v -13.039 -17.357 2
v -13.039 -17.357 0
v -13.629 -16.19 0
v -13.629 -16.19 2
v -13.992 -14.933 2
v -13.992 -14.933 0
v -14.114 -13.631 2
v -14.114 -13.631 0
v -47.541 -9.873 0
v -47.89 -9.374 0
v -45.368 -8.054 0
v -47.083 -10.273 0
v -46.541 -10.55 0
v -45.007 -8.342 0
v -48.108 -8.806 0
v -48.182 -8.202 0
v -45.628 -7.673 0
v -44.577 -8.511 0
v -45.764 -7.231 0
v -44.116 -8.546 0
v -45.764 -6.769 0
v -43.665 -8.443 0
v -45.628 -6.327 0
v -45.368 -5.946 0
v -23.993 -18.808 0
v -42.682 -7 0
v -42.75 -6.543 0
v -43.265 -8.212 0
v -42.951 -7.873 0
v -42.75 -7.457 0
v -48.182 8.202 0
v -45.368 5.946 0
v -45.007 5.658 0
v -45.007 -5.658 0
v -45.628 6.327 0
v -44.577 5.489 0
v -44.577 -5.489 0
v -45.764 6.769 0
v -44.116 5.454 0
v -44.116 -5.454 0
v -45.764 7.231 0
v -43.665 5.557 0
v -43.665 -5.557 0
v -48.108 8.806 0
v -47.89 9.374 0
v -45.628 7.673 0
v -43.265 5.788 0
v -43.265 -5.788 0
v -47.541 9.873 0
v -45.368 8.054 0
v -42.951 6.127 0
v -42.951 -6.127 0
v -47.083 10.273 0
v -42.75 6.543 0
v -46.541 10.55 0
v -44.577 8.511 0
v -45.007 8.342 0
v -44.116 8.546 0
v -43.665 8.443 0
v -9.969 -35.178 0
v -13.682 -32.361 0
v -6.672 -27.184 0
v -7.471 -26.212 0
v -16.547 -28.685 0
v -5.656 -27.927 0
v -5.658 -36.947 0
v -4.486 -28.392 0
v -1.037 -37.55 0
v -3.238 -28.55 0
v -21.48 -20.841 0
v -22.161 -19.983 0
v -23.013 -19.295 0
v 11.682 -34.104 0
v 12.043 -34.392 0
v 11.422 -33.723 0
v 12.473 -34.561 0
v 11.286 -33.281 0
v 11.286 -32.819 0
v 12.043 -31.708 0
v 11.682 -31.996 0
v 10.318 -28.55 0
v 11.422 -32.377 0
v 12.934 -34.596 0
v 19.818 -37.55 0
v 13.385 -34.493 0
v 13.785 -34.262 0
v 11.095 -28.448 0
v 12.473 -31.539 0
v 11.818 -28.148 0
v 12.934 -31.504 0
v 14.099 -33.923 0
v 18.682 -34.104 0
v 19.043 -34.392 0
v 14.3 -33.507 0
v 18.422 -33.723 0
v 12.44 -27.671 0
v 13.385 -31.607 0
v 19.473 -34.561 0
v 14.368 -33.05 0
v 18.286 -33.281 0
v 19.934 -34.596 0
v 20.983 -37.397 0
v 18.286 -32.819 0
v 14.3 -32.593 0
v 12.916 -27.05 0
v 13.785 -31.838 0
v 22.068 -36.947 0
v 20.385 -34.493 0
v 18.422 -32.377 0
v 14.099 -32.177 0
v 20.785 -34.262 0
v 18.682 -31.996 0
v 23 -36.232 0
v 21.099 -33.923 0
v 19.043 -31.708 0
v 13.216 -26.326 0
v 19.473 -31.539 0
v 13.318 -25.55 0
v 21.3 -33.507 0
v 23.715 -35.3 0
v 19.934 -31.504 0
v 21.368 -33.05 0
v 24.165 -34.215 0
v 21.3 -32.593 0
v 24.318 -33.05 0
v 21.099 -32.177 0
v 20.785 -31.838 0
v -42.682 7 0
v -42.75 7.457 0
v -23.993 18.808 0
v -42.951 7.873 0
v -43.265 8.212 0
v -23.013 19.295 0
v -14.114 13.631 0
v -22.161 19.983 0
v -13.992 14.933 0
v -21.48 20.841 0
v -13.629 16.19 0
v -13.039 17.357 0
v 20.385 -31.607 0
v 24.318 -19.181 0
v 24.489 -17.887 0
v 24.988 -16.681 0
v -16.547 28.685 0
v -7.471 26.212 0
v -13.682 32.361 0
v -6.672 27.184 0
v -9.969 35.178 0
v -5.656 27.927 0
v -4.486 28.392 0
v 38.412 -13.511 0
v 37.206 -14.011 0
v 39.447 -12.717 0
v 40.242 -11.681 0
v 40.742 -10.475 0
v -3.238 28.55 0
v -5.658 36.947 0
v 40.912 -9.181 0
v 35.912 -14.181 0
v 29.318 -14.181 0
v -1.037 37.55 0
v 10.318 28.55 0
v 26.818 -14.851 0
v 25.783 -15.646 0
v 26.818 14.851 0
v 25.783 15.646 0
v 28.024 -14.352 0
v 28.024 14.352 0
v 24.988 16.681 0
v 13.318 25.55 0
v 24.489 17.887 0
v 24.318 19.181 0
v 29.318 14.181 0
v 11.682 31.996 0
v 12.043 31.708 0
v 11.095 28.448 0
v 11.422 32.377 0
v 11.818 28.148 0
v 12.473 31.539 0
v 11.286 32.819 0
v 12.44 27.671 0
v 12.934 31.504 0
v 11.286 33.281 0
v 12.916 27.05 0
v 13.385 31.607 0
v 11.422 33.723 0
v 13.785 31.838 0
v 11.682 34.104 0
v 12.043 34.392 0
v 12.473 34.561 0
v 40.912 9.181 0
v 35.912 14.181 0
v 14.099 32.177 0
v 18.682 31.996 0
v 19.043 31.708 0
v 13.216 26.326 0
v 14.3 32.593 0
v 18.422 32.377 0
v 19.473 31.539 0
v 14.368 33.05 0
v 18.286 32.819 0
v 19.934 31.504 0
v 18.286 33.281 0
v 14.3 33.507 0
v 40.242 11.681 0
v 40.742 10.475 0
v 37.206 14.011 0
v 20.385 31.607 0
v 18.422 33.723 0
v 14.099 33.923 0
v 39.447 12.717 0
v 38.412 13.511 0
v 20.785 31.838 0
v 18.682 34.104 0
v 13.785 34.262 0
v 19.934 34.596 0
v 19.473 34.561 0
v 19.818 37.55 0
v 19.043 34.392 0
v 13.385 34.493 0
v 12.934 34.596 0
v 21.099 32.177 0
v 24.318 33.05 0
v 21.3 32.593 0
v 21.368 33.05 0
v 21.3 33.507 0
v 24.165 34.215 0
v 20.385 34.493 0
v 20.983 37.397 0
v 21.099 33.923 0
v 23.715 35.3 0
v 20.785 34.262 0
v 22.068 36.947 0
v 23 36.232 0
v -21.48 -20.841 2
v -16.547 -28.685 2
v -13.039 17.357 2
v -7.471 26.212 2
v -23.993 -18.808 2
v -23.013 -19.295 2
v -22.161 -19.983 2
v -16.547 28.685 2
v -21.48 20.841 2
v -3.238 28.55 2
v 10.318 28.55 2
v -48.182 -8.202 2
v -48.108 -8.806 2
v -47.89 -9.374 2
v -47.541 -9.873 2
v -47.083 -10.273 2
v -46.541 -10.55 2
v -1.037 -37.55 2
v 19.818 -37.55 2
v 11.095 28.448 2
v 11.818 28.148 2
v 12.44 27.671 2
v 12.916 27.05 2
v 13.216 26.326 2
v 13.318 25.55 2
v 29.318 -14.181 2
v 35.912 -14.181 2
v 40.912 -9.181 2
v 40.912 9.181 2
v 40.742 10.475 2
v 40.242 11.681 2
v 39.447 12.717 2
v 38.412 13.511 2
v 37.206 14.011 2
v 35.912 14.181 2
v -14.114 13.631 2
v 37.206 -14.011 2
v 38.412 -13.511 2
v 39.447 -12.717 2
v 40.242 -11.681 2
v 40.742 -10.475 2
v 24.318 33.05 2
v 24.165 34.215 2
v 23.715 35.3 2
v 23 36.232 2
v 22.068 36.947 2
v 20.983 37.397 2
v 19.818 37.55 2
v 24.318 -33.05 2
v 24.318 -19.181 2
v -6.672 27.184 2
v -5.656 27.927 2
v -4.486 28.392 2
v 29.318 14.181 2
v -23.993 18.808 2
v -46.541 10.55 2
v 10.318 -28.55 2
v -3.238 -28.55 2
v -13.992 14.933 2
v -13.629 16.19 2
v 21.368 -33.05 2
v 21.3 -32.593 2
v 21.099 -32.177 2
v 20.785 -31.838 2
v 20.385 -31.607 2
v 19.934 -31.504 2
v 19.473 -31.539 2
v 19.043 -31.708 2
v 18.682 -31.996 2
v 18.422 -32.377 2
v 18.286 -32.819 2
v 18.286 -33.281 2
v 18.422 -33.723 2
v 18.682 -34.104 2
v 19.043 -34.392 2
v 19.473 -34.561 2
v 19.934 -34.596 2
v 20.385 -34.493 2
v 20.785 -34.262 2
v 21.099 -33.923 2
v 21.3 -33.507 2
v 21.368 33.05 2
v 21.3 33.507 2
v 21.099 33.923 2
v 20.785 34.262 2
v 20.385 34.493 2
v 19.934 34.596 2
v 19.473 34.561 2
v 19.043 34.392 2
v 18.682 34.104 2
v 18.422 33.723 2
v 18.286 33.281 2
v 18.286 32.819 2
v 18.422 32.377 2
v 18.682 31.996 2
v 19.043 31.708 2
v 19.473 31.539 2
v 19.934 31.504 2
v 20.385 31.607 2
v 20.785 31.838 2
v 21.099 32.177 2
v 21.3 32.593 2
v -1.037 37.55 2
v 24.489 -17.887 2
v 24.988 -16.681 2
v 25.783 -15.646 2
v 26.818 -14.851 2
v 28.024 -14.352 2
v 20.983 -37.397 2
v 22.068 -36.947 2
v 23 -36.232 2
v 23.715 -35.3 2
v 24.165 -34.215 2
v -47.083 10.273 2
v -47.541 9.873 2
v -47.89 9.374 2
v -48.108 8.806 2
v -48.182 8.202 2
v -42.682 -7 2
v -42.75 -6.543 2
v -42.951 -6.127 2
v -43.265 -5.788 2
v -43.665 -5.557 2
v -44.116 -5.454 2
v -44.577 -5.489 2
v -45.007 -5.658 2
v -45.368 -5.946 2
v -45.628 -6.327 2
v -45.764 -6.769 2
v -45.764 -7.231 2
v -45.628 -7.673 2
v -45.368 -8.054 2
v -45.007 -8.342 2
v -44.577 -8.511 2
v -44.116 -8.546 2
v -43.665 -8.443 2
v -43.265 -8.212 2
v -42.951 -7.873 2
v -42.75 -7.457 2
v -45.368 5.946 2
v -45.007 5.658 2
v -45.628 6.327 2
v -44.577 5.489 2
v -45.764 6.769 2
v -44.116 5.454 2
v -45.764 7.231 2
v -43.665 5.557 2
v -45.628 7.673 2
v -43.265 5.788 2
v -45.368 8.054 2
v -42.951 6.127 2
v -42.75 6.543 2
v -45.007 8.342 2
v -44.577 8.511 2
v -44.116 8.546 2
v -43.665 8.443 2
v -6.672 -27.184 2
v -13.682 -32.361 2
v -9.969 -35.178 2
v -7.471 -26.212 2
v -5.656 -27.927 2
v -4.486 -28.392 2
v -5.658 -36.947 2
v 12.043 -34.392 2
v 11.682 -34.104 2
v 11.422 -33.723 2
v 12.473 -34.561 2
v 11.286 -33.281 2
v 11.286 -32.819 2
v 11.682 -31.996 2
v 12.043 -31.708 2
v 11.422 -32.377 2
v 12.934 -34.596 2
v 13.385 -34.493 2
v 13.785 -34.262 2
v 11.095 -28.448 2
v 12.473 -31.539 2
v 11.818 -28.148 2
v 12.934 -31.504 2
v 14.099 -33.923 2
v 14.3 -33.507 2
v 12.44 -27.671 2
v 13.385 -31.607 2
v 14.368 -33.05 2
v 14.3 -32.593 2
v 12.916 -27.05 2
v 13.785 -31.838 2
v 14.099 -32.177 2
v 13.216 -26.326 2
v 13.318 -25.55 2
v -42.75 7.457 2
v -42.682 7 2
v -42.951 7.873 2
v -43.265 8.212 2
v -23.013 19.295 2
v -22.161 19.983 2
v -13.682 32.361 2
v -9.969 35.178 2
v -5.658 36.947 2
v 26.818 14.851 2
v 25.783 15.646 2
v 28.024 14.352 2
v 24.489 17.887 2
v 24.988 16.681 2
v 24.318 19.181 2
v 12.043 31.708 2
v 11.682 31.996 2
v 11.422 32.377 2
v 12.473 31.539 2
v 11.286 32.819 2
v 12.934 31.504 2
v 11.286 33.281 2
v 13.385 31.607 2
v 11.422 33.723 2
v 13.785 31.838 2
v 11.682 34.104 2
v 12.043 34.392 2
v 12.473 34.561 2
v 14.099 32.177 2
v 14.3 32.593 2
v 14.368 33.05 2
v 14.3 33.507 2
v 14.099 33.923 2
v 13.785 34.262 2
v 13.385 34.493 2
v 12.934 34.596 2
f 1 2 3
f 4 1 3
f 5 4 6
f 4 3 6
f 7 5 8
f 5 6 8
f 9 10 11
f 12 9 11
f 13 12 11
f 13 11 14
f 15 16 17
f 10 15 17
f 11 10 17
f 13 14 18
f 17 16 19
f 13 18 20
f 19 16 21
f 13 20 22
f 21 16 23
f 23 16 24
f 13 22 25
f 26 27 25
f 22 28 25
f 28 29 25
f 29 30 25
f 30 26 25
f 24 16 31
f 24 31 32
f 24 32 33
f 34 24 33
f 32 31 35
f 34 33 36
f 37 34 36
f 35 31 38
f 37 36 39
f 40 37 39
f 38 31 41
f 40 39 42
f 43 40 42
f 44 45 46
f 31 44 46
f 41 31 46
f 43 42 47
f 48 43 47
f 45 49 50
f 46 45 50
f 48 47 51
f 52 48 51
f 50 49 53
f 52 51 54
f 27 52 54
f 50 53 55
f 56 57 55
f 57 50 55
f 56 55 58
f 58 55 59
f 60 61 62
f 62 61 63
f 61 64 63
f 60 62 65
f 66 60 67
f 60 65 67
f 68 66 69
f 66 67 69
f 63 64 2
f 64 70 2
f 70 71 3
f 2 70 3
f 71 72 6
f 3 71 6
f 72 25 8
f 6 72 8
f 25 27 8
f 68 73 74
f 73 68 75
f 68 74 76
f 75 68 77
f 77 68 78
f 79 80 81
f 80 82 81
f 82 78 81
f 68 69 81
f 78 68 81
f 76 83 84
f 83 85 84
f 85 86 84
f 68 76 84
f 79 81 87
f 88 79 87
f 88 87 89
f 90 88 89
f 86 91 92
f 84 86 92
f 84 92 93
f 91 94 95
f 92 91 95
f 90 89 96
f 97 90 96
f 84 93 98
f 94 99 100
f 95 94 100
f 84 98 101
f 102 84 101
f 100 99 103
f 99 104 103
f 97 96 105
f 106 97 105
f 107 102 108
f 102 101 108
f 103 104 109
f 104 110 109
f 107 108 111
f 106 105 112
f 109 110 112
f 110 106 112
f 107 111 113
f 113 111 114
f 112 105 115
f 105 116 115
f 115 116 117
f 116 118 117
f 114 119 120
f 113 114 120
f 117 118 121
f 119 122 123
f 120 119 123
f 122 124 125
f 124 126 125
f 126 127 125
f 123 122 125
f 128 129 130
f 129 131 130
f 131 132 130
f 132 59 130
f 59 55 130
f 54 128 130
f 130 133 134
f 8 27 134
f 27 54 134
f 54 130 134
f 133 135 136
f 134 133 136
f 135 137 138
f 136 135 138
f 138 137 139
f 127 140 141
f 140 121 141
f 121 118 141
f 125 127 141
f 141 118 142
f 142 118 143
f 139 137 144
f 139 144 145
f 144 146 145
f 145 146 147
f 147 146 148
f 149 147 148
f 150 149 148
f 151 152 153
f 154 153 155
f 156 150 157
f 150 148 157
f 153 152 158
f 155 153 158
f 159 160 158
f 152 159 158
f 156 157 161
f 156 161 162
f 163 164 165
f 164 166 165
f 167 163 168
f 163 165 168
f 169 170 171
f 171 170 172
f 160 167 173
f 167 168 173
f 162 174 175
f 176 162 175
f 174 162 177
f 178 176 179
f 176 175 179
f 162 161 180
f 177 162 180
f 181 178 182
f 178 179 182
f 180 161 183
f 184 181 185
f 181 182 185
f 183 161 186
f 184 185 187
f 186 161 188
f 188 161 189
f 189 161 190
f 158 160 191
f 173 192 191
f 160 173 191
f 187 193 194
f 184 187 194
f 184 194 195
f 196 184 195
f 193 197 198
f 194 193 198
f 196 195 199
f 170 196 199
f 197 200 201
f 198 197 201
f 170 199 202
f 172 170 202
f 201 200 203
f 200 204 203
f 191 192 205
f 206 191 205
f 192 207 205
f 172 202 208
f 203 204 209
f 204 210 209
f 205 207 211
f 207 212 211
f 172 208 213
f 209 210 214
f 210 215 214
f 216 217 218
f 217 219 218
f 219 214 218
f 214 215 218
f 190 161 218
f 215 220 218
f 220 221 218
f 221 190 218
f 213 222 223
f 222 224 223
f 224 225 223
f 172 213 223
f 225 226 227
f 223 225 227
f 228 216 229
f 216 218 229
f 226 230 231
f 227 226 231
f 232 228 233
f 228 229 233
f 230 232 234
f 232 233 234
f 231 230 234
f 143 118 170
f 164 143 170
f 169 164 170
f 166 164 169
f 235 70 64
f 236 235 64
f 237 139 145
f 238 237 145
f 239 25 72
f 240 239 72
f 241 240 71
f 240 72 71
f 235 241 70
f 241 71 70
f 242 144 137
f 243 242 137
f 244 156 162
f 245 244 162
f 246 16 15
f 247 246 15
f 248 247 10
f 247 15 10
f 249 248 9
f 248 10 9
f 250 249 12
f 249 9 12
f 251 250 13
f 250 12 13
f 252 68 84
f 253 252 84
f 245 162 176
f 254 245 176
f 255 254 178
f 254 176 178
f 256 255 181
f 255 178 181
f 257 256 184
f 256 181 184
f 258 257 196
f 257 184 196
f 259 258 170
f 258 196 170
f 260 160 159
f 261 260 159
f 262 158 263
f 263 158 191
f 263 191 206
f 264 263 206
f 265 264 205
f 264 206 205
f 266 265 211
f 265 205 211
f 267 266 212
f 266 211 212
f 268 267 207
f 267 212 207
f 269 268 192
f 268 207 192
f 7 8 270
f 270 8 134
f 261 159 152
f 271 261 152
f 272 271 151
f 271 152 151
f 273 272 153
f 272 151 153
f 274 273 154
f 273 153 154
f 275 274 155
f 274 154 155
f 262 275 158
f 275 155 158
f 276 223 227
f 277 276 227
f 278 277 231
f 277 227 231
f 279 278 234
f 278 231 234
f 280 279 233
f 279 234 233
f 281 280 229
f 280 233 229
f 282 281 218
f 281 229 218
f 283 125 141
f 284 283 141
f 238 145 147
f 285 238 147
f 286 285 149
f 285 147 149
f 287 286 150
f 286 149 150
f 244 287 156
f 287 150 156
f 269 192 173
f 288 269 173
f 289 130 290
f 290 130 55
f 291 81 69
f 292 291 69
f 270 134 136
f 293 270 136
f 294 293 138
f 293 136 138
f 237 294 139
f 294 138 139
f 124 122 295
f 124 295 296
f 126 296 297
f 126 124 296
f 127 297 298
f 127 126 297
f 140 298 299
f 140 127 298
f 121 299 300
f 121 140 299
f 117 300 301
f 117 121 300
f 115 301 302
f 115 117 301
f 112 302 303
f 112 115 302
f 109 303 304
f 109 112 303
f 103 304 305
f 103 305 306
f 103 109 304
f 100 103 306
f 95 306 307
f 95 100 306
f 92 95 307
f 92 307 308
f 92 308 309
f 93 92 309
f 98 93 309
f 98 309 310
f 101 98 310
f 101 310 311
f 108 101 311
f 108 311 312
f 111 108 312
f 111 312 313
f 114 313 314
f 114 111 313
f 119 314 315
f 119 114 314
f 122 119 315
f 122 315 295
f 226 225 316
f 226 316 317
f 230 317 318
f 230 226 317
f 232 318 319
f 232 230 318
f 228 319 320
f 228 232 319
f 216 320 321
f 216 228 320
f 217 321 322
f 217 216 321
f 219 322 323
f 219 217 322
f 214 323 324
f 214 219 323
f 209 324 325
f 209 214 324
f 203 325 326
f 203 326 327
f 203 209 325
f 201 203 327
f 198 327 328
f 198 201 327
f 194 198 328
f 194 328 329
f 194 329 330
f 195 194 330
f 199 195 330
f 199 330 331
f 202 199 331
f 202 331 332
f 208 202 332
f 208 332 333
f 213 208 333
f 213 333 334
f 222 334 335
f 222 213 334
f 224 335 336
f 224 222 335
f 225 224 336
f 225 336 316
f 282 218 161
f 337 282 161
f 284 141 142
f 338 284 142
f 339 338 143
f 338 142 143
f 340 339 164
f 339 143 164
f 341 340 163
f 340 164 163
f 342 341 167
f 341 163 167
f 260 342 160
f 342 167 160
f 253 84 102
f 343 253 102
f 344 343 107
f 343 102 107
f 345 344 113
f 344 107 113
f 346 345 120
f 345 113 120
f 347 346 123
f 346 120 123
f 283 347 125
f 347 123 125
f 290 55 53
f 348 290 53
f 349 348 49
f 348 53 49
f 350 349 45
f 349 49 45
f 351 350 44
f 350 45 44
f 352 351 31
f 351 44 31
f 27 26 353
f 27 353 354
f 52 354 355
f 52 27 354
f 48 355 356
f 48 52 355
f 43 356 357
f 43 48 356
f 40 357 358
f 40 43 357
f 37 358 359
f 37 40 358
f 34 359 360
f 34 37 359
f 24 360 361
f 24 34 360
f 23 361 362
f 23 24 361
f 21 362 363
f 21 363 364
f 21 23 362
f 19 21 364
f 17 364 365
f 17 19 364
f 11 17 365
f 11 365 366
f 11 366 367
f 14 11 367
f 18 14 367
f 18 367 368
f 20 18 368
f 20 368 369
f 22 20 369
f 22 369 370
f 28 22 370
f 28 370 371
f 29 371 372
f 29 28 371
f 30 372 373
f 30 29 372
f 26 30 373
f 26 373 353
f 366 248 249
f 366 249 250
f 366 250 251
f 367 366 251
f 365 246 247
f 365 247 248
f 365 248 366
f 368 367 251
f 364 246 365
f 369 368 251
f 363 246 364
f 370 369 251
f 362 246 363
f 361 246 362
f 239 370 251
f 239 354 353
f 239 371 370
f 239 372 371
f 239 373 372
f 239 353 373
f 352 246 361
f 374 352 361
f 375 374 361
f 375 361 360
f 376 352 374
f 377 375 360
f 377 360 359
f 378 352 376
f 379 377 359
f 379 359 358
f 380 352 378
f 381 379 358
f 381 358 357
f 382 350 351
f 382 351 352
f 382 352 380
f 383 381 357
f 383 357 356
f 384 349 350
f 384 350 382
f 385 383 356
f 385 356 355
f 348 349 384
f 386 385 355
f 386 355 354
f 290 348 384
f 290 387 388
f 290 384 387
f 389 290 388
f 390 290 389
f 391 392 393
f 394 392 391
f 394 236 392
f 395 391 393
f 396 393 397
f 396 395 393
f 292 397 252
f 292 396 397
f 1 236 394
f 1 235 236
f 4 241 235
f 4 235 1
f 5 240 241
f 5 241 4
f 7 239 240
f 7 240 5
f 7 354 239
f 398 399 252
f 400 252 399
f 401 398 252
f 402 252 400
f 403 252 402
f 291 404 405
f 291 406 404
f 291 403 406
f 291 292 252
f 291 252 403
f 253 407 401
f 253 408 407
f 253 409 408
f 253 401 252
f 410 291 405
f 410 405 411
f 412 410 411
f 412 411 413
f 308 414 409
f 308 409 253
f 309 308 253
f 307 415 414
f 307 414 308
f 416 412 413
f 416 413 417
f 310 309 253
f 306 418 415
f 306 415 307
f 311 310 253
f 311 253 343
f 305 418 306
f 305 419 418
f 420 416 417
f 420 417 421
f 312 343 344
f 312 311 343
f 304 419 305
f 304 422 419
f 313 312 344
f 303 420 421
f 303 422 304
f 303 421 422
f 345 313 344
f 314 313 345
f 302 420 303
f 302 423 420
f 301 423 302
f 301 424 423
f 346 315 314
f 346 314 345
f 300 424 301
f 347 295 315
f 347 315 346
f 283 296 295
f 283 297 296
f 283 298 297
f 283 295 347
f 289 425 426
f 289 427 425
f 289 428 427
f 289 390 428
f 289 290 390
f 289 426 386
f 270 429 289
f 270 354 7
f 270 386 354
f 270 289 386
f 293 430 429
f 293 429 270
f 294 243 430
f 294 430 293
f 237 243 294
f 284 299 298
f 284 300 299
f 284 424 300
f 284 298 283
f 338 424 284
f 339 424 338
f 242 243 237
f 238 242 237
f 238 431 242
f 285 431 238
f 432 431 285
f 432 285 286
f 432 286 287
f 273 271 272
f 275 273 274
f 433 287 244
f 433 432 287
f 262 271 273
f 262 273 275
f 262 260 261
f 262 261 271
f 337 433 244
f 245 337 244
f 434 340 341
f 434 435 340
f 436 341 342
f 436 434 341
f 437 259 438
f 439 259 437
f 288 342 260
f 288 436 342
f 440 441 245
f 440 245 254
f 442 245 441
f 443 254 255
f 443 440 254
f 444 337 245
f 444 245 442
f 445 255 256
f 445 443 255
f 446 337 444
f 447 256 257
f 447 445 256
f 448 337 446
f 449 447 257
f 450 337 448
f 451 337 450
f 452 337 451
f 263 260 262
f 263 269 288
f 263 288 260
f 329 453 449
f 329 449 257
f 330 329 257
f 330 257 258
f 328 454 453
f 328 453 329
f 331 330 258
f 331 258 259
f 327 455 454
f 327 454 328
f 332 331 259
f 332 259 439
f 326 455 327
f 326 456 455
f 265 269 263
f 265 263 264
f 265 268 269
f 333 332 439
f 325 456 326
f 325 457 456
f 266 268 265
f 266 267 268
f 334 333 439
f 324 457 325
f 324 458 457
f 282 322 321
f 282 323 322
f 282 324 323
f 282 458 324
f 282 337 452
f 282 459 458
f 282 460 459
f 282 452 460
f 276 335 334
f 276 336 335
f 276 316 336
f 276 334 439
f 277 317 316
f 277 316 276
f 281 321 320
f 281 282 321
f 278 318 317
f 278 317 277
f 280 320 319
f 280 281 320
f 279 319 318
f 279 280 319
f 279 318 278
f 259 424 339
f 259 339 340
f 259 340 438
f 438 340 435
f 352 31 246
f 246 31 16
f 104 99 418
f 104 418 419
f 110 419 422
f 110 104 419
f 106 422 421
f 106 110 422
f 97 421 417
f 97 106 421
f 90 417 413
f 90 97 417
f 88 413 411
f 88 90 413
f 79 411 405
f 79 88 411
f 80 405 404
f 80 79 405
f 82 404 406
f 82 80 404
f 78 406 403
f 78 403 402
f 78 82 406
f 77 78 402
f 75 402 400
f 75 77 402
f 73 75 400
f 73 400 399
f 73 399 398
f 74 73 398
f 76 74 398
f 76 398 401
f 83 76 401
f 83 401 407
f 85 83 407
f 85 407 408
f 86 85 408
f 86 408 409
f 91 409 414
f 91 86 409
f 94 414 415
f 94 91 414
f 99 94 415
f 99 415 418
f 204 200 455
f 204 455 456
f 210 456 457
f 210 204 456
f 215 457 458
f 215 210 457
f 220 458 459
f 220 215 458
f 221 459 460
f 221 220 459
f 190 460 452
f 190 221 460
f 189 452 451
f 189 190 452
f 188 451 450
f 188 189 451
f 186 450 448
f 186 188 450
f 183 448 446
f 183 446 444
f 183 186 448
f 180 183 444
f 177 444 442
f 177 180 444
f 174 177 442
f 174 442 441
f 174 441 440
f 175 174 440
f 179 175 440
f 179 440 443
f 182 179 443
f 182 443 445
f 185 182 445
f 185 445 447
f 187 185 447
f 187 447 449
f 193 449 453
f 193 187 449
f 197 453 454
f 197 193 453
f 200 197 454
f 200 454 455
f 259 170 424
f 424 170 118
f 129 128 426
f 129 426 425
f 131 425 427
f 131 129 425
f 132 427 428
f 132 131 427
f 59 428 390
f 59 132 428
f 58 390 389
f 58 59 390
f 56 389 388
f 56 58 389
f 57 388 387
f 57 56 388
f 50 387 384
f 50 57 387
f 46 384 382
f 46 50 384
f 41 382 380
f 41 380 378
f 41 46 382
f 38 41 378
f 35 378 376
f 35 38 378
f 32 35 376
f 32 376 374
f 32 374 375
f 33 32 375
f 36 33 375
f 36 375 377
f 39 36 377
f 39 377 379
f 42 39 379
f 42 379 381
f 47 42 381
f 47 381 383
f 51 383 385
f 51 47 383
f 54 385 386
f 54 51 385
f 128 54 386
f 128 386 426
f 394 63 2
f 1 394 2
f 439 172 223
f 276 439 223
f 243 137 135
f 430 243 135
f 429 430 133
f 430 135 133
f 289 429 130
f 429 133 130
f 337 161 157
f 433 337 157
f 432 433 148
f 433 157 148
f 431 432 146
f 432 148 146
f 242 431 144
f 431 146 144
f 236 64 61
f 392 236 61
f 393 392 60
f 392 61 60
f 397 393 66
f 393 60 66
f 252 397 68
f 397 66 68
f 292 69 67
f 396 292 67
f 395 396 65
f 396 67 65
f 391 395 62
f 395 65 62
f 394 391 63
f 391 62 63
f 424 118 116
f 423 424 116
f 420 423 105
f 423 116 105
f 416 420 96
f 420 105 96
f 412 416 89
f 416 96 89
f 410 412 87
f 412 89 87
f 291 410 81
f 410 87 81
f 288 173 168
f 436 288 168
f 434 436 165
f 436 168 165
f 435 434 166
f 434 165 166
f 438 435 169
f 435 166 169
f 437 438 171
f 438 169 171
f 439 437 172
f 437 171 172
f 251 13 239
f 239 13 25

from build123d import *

# Parameters (mm, degrees)
F0_R     = 1.55
F1_DEPTH = 2


with BuildPart() as f1:
    # F0 (on Top) → F1 (new body)
    with BuildSketch(Plane.XY):
        with BuildLine():
            Line((24.31838, 19.181142), (24.31838, 33.05))
            ThreePointArc((24.31838, 33.05), (23.000361, 36.231981), (19.81838, 37.55))
            Line((19.81838, 37.55), (-1.037385, 37.55))
            ThreePointArc((-1.037385, 37.55), (-9.969408, 35.177507), (-16.546857, 28.685441))
            Line((-16.546857, 28.685441), (-21.480482, 20.840884))
            ThreePointArc((-21.480482, 20.840884), (-22.568149, 19.615657), (-23.993472, 18.807786))
            Line((-23.993472, 18.807786), (-46.541382, 10.54976))
            ThreePointArc((-46.541382, 10.54976), (-47.730939, 9.634135), (-48.181621, 8.202248))
            Line((-48.181621, 8.202248), (-48.181621, -8.202248))
            ThreePointArc((-48.181621, -8.202248), (-47.730939, -9.634135), (-46.541382, -10.54976))
            Line((-46.541382, -10.54976), (-23.993472, -18.807786))
            ThreePointArc((-23.993472, -18.807786), (-22.568149, -19.615657), (-21.480482, -20.840884))
            Line((-21.480482, -20.840884), (-16.546857, -28.685441))
            ThreePointArc((-16.546857, -28.685441), (-9.969408, -35.177507), (-1.037385, -37.55))
            Line((-1.037385, -37.55), (19.81838, -37.55))
            ThreePointArc((19.81838, -37.55), (23.000361, -36.231981), (24.31838, -33.05))
            Line((24.31838, -33.05), (24.31838, -19.181142))
            ThreePointArc((24.31838, -19.181142), (25.782846, -15.645608), (29.31838, -14.181142))
            Line((29.31838, -14.181142), (35.911883, -14.181142))
            ThreePointArc((35.911883, -14.181142), (39.447417, -12.716676), (40.911883, -9.181142))
            Line((40.911883, -9.181142), (40.911883, 0))
            Line((40.911883, 0), (40.911883, 9.181142))
            ThreePointArc((40.911883, 9.181142), (39.447417, 12.716676), (35.911883, 14.181142))
            Line((35.911883, 14.181142), (29.31838, 14.181142))
            ThreePointArc((29.31838, 14.181142), (25.782846, 15.645608), (24.31838, 19.181142))
        make_face()
        with Locations((-44.231621, -7)):
            Circle(F0_R, mode=Mode.SUBTRACT)
        with Locations((12.81838, -33.05)):
            Circle(F0_R, mode=Mode.SUBTRACT)
        with Locations((19.81838, -33.05)):
            Circle(F0_R, mode=Mode.SUBTRACT)
        with Locations((-44.231621, 7)):
            Circle(F0_R, mode=Mode.SUBTRACT)
        with BuildLine():
            Line((-13.039333, 17.357413), (-7.470524, 26.211925))
            ThreePointArc((-7.470524, 26.211925), (-5.655694, 27.926621), (-3.238012, 28.55))
            Line((-3.238012, 28.55), (10.31838, 28.55))
            ThreePointArc((10.31838, 28.55), (12.439701, 27.67132), (13.31838, 25.55))
            Line((13.31838, 25.55), (13.31838, -25.55))
            ThreePointArc((13.31838, -25.55), (12.439701, -27.67132), (10.31838, -28.55))
            Line((10.31838, -28.55), (-3.238012, -28.55))
            ThreePointArc((-3.238012, -28.55), (-5.655694, -27.926621), (-7.470524, -26.211925))
            Line((-7.470524, -26.211925), (-13.039333, -17.357413))
            ThreePointArc((-13.039333, -17.357413), (-13.839835, -15.569969), (-14.113817, -13.630718))
            Line((-14.113817, -13.630718), (-14.113817, 13.630718))
            ThreePointArc((-14.113817, 13.630718), (-13.839835, 15.569969), (-13.039333, 17.357413))
        make_face(mode=Mode.SUBTRACT)
        with Locations((12.81838, 33.05)):
            Circle(F0_R, mode=Mode.SUBTRACT)
        with Locations((19.81838, 33.05)):
            Circle(F0_R, mode=Mode.SUBTRACT)
    extrude(amount=F1_DEPTH)


solid = f1.part
